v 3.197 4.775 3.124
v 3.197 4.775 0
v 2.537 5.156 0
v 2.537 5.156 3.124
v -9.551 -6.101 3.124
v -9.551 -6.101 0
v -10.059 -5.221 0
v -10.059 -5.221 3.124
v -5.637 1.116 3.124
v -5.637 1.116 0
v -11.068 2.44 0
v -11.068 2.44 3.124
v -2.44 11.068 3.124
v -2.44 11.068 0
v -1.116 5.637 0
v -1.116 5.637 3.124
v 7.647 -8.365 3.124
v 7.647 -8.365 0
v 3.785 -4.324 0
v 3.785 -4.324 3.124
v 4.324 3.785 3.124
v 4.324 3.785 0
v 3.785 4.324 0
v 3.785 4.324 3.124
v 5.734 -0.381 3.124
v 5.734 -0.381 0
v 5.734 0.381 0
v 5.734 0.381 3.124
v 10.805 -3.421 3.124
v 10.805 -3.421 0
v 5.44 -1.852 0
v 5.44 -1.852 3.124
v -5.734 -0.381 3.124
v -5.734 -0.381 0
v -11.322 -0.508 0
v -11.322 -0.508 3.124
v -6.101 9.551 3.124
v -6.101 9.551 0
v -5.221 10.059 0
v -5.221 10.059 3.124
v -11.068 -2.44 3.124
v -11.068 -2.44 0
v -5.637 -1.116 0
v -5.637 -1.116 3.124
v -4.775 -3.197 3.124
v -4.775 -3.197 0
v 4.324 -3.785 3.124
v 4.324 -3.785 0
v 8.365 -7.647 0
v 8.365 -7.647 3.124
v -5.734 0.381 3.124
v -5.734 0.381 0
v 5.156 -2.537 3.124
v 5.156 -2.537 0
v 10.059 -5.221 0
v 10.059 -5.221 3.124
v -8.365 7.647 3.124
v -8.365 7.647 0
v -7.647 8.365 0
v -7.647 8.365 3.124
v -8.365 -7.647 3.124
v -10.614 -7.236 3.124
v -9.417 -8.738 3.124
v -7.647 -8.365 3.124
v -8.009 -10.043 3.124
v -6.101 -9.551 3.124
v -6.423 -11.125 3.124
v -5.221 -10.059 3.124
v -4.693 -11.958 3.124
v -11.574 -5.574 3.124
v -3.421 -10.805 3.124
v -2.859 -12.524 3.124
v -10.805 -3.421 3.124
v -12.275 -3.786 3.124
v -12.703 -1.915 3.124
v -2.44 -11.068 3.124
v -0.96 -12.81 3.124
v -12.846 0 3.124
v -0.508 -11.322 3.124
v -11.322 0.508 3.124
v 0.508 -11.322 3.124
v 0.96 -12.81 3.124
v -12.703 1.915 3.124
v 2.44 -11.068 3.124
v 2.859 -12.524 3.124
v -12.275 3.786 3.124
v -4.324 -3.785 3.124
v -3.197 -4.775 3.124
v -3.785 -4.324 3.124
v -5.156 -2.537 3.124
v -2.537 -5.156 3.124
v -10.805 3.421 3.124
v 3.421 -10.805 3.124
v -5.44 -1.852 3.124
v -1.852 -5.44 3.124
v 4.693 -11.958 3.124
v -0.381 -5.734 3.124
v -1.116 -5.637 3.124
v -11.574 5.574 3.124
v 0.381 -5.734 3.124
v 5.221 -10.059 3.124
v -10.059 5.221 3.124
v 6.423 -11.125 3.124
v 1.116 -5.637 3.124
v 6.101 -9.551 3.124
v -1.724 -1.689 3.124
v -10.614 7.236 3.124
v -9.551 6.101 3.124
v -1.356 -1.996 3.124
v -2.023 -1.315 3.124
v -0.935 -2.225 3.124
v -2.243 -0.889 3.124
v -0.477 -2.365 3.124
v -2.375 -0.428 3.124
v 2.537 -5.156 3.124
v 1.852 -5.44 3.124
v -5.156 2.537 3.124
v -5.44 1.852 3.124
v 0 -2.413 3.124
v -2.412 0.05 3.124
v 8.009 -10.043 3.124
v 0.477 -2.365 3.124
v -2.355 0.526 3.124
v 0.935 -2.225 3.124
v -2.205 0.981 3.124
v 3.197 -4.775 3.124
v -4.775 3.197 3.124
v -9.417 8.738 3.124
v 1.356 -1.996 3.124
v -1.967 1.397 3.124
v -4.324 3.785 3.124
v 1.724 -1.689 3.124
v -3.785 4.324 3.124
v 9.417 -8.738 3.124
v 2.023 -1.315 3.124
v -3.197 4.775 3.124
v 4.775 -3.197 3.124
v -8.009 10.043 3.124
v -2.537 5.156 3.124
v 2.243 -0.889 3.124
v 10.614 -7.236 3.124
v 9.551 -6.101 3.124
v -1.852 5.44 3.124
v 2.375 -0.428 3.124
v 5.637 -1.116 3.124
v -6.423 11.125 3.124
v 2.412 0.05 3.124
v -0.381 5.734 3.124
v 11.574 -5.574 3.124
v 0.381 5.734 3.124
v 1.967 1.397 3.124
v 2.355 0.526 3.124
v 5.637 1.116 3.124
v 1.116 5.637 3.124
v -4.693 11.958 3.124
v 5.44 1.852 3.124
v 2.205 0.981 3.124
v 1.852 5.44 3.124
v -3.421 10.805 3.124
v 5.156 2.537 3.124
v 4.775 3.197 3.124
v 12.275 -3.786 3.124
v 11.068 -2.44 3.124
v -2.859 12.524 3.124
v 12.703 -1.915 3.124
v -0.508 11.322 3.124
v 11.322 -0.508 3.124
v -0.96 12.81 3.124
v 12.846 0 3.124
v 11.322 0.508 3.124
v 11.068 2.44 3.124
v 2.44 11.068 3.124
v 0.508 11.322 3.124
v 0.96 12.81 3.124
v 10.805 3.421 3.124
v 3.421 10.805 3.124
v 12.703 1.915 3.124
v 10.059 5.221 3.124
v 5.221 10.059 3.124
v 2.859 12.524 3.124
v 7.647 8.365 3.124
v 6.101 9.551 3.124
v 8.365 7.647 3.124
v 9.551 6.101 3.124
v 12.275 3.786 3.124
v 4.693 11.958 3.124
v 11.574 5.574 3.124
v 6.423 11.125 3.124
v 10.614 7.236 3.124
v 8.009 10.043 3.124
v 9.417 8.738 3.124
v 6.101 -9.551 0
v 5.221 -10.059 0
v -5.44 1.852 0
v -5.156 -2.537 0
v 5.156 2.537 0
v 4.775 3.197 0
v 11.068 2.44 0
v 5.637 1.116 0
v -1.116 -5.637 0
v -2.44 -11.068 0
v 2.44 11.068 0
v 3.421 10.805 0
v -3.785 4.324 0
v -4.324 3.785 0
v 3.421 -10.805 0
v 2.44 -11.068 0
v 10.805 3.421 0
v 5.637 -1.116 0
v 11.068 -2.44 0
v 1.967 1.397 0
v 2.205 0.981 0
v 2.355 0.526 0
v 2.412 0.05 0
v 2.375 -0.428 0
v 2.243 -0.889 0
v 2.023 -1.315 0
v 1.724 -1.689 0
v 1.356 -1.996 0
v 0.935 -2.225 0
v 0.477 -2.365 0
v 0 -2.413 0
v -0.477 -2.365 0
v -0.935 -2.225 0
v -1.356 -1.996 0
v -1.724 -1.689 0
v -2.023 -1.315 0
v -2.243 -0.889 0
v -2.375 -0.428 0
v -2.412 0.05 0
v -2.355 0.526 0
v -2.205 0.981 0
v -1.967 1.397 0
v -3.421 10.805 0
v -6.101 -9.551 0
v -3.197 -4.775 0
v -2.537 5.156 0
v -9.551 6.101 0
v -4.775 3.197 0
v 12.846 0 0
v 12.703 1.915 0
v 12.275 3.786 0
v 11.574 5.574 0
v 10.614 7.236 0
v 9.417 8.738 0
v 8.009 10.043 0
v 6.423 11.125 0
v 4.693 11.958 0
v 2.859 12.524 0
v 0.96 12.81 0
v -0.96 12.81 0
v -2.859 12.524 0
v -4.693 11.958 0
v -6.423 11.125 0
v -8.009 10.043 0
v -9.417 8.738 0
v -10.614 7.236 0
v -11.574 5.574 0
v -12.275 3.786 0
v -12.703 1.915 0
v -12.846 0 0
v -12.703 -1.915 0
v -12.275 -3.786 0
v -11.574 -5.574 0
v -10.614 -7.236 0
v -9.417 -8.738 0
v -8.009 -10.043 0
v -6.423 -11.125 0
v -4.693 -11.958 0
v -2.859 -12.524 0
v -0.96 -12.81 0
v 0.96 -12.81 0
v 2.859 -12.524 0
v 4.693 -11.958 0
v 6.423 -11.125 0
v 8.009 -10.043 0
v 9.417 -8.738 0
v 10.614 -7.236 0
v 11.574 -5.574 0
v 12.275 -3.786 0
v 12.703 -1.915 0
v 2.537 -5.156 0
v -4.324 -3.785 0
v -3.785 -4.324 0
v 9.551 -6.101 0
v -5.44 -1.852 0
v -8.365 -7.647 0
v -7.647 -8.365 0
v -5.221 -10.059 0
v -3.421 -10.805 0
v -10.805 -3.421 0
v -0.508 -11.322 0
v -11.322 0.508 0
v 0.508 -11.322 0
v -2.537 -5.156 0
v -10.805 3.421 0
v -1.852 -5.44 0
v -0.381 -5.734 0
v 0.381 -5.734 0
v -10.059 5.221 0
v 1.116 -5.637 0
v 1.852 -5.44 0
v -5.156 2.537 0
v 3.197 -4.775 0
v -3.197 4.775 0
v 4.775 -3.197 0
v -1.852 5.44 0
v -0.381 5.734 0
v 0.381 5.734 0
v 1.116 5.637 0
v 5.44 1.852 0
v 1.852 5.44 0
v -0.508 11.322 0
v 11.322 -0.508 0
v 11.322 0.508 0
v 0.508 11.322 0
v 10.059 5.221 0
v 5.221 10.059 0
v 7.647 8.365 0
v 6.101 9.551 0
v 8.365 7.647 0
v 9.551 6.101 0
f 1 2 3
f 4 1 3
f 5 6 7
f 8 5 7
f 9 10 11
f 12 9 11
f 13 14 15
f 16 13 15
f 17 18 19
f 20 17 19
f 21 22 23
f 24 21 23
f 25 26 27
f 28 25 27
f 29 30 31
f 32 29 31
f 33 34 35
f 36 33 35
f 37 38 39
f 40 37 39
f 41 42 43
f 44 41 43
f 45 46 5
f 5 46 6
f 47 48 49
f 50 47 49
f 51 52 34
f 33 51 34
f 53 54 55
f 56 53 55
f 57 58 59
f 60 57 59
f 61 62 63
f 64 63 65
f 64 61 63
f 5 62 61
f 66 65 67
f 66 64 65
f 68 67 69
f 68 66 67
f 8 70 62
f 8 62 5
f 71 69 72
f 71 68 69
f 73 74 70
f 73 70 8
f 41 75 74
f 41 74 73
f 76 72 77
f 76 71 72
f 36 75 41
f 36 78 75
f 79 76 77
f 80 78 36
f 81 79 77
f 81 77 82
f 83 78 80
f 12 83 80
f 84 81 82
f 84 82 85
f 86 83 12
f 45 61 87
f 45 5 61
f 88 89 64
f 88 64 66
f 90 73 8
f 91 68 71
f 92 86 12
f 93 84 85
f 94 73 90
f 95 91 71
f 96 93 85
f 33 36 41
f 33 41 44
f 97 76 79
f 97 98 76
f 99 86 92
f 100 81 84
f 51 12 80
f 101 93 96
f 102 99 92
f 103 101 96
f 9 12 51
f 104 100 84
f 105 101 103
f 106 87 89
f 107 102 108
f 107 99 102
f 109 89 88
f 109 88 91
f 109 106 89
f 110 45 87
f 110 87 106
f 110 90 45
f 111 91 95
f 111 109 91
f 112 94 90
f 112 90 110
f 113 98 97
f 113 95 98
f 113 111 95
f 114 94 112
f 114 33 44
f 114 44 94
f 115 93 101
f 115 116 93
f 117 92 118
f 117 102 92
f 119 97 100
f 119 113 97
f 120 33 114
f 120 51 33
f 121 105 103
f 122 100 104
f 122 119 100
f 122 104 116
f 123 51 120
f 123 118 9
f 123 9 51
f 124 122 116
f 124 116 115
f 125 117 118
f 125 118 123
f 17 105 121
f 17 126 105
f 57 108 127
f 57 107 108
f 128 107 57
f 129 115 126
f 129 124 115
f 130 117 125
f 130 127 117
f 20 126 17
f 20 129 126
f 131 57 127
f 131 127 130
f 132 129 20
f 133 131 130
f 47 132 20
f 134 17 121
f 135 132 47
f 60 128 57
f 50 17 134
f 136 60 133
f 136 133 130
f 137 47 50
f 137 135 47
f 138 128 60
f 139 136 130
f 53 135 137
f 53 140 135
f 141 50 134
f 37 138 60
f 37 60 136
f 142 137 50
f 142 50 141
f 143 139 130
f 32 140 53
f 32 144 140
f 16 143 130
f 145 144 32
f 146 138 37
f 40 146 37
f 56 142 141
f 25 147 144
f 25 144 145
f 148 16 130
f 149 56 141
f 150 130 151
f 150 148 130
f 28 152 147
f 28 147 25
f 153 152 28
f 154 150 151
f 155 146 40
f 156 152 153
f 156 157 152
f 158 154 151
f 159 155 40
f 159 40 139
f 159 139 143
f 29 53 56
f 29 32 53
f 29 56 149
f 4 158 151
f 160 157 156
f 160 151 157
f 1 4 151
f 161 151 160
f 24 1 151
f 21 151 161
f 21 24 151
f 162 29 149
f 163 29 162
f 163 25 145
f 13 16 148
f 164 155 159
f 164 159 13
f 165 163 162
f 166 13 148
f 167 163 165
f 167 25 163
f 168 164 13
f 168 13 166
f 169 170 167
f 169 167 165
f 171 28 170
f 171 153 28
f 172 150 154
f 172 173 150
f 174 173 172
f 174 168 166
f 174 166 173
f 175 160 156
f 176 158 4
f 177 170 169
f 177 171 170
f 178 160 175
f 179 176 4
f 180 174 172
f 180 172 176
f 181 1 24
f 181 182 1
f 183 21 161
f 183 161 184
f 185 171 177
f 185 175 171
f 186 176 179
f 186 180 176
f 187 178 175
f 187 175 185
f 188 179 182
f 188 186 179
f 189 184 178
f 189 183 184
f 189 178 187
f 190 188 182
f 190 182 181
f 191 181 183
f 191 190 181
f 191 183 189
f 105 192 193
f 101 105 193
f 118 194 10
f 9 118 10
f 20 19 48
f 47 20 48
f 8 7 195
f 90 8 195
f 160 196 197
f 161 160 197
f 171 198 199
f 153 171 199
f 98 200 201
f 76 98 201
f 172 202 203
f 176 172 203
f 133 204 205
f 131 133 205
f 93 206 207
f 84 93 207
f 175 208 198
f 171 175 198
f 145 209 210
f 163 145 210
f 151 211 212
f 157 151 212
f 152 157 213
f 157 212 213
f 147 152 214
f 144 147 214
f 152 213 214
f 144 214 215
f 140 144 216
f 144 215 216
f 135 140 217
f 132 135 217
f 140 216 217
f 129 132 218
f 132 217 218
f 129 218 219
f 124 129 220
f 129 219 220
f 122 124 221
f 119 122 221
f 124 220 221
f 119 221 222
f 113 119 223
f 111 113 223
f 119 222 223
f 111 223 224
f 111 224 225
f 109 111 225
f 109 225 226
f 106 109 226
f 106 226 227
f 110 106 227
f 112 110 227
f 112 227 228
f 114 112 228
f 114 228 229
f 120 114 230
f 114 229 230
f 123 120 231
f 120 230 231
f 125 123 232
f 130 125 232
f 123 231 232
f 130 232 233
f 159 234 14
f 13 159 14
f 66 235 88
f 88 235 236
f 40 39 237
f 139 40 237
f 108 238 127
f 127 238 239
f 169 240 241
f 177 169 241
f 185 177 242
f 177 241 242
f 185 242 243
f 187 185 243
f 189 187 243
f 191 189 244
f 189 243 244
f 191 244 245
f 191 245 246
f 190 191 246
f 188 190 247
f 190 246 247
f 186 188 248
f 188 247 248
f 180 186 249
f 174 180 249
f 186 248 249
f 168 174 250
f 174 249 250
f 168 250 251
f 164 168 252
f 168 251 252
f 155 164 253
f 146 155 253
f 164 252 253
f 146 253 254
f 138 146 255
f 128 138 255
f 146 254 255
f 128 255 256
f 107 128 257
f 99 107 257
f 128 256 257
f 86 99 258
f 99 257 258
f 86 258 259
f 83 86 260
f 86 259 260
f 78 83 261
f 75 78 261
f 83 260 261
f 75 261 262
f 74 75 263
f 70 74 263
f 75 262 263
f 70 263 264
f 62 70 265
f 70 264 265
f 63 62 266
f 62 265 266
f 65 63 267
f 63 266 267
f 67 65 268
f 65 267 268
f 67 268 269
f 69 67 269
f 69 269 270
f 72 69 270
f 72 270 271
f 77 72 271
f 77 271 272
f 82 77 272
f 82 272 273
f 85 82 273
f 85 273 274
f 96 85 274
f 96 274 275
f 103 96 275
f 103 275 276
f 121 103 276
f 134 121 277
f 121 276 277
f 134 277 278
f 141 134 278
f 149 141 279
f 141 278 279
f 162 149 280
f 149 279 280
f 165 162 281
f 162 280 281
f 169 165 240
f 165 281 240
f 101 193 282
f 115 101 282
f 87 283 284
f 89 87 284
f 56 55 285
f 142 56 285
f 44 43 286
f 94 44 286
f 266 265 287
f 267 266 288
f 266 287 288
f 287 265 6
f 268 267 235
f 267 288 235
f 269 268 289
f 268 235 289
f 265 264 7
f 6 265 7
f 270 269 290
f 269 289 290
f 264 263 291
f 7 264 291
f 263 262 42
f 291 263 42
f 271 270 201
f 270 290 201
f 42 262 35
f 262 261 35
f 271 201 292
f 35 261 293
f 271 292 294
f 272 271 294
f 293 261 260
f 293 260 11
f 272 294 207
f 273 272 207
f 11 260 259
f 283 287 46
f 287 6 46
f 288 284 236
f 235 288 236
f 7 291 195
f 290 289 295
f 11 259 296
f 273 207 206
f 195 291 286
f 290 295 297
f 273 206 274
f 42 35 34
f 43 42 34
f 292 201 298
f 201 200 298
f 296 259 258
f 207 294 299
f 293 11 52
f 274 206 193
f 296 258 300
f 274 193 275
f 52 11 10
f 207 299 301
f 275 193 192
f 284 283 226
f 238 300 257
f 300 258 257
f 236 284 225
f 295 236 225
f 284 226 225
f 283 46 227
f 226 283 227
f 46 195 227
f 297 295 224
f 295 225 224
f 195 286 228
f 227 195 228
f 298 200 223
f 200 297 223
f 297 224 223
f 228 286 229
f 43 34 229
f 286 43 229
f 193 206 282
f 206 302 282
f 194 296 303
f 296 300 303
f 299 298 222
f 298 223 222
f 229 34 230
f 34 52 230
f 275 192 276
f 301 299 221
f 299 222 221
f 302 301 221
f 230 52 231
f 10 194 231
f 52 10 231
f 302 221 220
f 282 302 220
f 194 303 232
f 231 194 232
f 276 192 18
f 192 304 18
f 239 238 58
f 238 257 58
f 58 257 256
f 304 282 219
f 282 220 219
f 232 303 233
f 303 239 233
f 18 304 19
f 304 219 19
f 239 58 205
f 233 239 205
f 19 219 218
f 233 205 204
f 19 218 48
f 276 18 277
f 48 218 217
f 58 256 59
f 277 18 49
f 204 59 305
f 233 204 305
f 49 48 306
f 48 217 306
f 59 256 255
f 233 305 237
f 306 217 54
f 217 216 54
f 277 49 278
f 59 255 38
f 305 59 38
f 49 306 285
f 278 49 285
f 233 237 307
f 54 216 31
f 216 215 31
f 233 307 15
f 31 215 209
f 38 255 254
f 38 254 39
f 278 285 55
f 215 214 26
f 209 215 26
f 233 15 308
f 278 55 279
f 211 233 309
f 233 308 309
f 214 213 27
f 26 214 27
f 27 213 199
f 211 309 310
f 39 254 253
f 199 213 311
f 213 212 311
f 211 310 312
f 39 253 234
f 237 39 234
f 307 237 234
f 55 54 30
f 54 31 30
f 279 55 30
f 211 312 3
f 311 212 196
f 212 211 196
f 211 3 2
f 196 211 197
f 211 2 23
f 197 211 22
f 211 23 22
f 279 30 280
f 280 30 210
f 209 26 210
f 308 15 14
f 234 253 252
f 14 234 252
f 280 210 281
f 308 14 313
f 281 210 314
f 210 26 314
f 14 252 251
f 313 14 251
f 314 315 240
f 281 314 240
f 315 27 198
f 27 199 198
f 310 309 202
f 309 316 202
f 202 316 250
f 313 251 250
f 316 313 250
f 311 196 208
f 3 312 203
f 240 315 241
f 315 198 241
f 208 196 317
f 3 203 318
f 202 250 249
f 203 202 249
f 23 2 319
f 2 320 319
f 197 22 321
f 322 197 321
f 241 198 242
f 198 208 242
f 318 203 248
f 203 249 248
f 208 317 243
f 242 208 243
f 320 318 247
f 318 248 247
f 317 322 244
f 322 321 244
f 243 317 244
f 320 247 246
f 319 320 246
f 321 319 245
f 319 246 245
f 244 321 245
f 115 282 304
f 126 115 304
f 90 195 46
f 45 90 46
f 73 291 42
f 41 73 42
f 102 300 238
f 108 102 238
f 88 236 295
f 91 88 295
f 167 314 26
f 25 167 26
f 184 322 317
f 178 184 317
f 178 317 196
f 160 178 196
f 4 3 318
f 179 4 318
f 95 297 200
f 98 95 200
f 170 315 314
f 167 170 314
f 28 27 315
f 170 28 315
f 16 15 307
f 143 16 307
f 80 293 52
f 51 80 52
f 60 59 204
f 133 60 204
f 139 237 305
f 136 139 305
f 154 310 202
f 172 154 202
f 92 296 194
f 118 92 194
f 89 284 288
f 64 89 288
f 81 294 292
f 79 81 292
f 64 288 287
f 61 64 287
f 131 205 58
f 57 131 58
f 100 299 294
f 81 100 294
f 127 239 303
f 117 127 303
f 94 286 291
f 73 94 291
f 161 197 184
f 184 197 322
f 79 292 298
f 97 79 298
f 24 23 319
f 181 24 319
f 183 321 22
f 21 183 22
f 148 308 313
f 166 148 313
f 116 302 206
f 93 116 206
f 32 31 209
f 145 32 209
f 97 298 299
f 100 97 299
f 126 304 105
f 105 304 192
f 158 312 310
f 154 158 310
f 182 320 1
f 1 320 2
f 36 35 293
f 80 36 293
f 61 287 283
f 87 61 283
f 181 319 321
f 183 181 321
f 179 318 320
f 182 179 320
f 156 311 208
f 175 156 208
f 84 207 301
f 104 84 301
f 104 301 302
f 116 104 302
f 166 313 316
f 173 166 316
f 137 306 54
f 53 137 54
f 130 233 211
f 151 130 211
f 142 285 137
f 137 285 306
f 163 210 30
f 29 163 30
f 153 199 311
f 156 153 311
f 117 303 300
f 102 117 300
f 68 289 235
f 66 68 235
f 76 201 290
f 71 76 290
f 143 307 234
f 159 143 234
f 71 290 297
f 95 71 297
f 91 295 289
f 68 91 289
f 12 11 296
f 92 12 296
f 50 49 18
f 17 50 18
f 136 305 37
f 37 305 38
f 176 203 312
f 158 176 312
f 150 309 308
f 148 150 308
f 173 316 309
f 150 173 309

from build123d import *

# Parameters (mm, degrees)
CROQUIS1_R              = 12.84605
SALIENTE_EXTRUIR2_DEPTH = 3.1242


with BuildPart() as part:
    # Croquis1 → Saliente-Extruir2 (new body)
    with BuildSketch(Plane.XY):
        Circle(CROQUIS1_R)
        Polygon((0.508, 11.32205), (0.381, 5.73405), (-0.381, 5.73405), (-0.508, 11.32205), align=None, mode=Mode.SUBTRACT)
        Polygon((-7.646688087, -8.365108577), (-8.365108577, -7.646688087), (-4.323993322, -3.785177955), (-3.785177955, -4.323993322), align=None, mode=Mode.SUBTRACT)
        Polygon((-5.221084095, -10.059182923), (-6.100965905, -9.551182923), (-3.196980679, -4.775332967), (-2.537069321, -5.156332967), align=None, mode=Mode.SUBTRACT)
        Polygon((-2.43967185, -11.067740576), (-3.421052489, -10.804780427), (-1.852099085, -5.440056928), (-1.116063606, -5.63727704), align=None, mode=Mode.SUBTRACT)
        Polygon((-9.551182923, -6.100965905), (-10.059182923, -5.221084095), (-5.156332967, -2.537069321), (-4.775332967, -3.196980679), align=None, mode=Mode.SUBTRACT)
        Polygon((-11.32205, -0.508), (-11.32205, 0.508), (-5.73405, 0.381), (-5.73405, -0.381), align=None, mode=Mode.SUBTRACT)
        Polygon((-10.804780427, -3.421052489), (-11.067740576, -2.43967185), (-5.63727704, -1.116063606), (-5.440056928, -1.852099085), align=None, mode=Mode.SUBTRACT)
        Polygon((0.508, -11.32205), (-0.508, -11.32205), (-0.381, -5.73405), (0.381, -5.73405), align=None, mode=Mode.SUBTRACT)
        Polygon((3.421052489, -10.804780427), (2.43967185, -11.067740576), (1.116063606, -5.63727704), (1.852099085, -5.440056928), align=None, mode=Mode.SUBTRACT)
        Polygon((6.100965905, -9.551182923), (5.221084095, -10.059182923), (2.537069321, -5.156332967), (3.196980679, -4.775332967), align=None, mode=Mode.SUBTRACT)
        Polygon((8.365108577, -7.646688087), (7.646688087, -8.365108577), (3.785177955, -4.323993322), (4.323993322, -3.785177955), align=None, mode=Mode.SUBTRACT)
        Polygon((10.059182923, -5.221084095), (9.551182923, -6.100965905), (4.775332967, -3.196980679), (5.156332967, -2.537069321), align=None, mode=Mode.SUBTRACT)
        Polygon((11.067740576, -2.43967185), (10.804780427, -3.421052489), (5.440056928, -1.852099085), (5.63727704, -1.116063606), align=None, mode=Mode.SUBTRACT)
        Polygon((-11.067740576, 2.43967185), (-10.804780427, 3.421052489), (-5.440056928, 1.852099085), (-5.63727704, 1.116063606), align=None, mode=Mode.SUBTRACT)
        Polygon((-10.059182923, 5.221084095), (-9.551182923, 6.100965905), (-4.775332967, 3.196980679), (-5.156332967, 2.537069321), align=None, mode=Mode.SUBTRACT)
        with BuildLine():
            Line((-1.96747554, 1.397), (1.96747554, 1.397))
            ThreePointArc((1.96747554, 1.397), (0, -2.413), (-1.96747554, 1.397))
        make_face(mode=Mode.SUBTRACT)
        Polygon((-8.365108577, 7.646688087), (-7.646688087, 8.365108577), (-3.785177955, 4.323993322), (-4.323993322, 3.785177955), align=None, mode=Mode.SUBTRACT)
        Polygon((-6.100965905, 9.551182923), (-5.221084095, 10.059182923), (-2.537069321, 5.156332967), (-3.196980679, 4.775332967), align=None, mode=Mode.SUBTRACT)
        Polygon((-3.421052489, 10.804780427), (-2.43967185, 11.067740576), (-1.116063606, 5.63727704), (-1.852099085, 5.440056928), align=None, mode=Mode.SUBTRACT)
        Polygon((10.804780427, 3.421052489), (11.067740576, 2.43967185), (5.63727704, 1.116063606), (5.440056928, 1.852099085), align=None, mode=Mode.SUBTRACT)
        Polygon((11.32205, 0.508), (11.32205, -0.508), (5.73405, -0.381), (5.73405, 0.381), align=None, mode=Mode.SUBTRACT)
        Polygon((9.551182923, 6.100965905), (10.059182923, 5.221084095), (5.156332967, 2.537069321), (4.775332967, 3.196980679), align=None, mode=Mode.SUBTRACT)
        Polygon((2.43967185, 11.067740576), (3.421052489, 10.804780427), (1.852099085, 5.440056928), (1.116063606, 5.63727704), align=None, mode=Mode.SUBTRACT)
        Polygon((5.221084095, 10.059182923), (6.100965905, 9.551182923), (3.196980679, 4.775332967), (2.537069321, 5.156332967), align=None, mode=Mode.SUBTRACT)
        Polygon((7.646688087, 8.365108577), (8.365108577, 7.646688087), (4.323993322, 3.785177955), (3.785177955, 4.323993322), align=None, mode=Mode.SUBTRACT)
    extrude(amount=SALIENTE_EXTRUIR2_DEPTH)


solid = part.part
